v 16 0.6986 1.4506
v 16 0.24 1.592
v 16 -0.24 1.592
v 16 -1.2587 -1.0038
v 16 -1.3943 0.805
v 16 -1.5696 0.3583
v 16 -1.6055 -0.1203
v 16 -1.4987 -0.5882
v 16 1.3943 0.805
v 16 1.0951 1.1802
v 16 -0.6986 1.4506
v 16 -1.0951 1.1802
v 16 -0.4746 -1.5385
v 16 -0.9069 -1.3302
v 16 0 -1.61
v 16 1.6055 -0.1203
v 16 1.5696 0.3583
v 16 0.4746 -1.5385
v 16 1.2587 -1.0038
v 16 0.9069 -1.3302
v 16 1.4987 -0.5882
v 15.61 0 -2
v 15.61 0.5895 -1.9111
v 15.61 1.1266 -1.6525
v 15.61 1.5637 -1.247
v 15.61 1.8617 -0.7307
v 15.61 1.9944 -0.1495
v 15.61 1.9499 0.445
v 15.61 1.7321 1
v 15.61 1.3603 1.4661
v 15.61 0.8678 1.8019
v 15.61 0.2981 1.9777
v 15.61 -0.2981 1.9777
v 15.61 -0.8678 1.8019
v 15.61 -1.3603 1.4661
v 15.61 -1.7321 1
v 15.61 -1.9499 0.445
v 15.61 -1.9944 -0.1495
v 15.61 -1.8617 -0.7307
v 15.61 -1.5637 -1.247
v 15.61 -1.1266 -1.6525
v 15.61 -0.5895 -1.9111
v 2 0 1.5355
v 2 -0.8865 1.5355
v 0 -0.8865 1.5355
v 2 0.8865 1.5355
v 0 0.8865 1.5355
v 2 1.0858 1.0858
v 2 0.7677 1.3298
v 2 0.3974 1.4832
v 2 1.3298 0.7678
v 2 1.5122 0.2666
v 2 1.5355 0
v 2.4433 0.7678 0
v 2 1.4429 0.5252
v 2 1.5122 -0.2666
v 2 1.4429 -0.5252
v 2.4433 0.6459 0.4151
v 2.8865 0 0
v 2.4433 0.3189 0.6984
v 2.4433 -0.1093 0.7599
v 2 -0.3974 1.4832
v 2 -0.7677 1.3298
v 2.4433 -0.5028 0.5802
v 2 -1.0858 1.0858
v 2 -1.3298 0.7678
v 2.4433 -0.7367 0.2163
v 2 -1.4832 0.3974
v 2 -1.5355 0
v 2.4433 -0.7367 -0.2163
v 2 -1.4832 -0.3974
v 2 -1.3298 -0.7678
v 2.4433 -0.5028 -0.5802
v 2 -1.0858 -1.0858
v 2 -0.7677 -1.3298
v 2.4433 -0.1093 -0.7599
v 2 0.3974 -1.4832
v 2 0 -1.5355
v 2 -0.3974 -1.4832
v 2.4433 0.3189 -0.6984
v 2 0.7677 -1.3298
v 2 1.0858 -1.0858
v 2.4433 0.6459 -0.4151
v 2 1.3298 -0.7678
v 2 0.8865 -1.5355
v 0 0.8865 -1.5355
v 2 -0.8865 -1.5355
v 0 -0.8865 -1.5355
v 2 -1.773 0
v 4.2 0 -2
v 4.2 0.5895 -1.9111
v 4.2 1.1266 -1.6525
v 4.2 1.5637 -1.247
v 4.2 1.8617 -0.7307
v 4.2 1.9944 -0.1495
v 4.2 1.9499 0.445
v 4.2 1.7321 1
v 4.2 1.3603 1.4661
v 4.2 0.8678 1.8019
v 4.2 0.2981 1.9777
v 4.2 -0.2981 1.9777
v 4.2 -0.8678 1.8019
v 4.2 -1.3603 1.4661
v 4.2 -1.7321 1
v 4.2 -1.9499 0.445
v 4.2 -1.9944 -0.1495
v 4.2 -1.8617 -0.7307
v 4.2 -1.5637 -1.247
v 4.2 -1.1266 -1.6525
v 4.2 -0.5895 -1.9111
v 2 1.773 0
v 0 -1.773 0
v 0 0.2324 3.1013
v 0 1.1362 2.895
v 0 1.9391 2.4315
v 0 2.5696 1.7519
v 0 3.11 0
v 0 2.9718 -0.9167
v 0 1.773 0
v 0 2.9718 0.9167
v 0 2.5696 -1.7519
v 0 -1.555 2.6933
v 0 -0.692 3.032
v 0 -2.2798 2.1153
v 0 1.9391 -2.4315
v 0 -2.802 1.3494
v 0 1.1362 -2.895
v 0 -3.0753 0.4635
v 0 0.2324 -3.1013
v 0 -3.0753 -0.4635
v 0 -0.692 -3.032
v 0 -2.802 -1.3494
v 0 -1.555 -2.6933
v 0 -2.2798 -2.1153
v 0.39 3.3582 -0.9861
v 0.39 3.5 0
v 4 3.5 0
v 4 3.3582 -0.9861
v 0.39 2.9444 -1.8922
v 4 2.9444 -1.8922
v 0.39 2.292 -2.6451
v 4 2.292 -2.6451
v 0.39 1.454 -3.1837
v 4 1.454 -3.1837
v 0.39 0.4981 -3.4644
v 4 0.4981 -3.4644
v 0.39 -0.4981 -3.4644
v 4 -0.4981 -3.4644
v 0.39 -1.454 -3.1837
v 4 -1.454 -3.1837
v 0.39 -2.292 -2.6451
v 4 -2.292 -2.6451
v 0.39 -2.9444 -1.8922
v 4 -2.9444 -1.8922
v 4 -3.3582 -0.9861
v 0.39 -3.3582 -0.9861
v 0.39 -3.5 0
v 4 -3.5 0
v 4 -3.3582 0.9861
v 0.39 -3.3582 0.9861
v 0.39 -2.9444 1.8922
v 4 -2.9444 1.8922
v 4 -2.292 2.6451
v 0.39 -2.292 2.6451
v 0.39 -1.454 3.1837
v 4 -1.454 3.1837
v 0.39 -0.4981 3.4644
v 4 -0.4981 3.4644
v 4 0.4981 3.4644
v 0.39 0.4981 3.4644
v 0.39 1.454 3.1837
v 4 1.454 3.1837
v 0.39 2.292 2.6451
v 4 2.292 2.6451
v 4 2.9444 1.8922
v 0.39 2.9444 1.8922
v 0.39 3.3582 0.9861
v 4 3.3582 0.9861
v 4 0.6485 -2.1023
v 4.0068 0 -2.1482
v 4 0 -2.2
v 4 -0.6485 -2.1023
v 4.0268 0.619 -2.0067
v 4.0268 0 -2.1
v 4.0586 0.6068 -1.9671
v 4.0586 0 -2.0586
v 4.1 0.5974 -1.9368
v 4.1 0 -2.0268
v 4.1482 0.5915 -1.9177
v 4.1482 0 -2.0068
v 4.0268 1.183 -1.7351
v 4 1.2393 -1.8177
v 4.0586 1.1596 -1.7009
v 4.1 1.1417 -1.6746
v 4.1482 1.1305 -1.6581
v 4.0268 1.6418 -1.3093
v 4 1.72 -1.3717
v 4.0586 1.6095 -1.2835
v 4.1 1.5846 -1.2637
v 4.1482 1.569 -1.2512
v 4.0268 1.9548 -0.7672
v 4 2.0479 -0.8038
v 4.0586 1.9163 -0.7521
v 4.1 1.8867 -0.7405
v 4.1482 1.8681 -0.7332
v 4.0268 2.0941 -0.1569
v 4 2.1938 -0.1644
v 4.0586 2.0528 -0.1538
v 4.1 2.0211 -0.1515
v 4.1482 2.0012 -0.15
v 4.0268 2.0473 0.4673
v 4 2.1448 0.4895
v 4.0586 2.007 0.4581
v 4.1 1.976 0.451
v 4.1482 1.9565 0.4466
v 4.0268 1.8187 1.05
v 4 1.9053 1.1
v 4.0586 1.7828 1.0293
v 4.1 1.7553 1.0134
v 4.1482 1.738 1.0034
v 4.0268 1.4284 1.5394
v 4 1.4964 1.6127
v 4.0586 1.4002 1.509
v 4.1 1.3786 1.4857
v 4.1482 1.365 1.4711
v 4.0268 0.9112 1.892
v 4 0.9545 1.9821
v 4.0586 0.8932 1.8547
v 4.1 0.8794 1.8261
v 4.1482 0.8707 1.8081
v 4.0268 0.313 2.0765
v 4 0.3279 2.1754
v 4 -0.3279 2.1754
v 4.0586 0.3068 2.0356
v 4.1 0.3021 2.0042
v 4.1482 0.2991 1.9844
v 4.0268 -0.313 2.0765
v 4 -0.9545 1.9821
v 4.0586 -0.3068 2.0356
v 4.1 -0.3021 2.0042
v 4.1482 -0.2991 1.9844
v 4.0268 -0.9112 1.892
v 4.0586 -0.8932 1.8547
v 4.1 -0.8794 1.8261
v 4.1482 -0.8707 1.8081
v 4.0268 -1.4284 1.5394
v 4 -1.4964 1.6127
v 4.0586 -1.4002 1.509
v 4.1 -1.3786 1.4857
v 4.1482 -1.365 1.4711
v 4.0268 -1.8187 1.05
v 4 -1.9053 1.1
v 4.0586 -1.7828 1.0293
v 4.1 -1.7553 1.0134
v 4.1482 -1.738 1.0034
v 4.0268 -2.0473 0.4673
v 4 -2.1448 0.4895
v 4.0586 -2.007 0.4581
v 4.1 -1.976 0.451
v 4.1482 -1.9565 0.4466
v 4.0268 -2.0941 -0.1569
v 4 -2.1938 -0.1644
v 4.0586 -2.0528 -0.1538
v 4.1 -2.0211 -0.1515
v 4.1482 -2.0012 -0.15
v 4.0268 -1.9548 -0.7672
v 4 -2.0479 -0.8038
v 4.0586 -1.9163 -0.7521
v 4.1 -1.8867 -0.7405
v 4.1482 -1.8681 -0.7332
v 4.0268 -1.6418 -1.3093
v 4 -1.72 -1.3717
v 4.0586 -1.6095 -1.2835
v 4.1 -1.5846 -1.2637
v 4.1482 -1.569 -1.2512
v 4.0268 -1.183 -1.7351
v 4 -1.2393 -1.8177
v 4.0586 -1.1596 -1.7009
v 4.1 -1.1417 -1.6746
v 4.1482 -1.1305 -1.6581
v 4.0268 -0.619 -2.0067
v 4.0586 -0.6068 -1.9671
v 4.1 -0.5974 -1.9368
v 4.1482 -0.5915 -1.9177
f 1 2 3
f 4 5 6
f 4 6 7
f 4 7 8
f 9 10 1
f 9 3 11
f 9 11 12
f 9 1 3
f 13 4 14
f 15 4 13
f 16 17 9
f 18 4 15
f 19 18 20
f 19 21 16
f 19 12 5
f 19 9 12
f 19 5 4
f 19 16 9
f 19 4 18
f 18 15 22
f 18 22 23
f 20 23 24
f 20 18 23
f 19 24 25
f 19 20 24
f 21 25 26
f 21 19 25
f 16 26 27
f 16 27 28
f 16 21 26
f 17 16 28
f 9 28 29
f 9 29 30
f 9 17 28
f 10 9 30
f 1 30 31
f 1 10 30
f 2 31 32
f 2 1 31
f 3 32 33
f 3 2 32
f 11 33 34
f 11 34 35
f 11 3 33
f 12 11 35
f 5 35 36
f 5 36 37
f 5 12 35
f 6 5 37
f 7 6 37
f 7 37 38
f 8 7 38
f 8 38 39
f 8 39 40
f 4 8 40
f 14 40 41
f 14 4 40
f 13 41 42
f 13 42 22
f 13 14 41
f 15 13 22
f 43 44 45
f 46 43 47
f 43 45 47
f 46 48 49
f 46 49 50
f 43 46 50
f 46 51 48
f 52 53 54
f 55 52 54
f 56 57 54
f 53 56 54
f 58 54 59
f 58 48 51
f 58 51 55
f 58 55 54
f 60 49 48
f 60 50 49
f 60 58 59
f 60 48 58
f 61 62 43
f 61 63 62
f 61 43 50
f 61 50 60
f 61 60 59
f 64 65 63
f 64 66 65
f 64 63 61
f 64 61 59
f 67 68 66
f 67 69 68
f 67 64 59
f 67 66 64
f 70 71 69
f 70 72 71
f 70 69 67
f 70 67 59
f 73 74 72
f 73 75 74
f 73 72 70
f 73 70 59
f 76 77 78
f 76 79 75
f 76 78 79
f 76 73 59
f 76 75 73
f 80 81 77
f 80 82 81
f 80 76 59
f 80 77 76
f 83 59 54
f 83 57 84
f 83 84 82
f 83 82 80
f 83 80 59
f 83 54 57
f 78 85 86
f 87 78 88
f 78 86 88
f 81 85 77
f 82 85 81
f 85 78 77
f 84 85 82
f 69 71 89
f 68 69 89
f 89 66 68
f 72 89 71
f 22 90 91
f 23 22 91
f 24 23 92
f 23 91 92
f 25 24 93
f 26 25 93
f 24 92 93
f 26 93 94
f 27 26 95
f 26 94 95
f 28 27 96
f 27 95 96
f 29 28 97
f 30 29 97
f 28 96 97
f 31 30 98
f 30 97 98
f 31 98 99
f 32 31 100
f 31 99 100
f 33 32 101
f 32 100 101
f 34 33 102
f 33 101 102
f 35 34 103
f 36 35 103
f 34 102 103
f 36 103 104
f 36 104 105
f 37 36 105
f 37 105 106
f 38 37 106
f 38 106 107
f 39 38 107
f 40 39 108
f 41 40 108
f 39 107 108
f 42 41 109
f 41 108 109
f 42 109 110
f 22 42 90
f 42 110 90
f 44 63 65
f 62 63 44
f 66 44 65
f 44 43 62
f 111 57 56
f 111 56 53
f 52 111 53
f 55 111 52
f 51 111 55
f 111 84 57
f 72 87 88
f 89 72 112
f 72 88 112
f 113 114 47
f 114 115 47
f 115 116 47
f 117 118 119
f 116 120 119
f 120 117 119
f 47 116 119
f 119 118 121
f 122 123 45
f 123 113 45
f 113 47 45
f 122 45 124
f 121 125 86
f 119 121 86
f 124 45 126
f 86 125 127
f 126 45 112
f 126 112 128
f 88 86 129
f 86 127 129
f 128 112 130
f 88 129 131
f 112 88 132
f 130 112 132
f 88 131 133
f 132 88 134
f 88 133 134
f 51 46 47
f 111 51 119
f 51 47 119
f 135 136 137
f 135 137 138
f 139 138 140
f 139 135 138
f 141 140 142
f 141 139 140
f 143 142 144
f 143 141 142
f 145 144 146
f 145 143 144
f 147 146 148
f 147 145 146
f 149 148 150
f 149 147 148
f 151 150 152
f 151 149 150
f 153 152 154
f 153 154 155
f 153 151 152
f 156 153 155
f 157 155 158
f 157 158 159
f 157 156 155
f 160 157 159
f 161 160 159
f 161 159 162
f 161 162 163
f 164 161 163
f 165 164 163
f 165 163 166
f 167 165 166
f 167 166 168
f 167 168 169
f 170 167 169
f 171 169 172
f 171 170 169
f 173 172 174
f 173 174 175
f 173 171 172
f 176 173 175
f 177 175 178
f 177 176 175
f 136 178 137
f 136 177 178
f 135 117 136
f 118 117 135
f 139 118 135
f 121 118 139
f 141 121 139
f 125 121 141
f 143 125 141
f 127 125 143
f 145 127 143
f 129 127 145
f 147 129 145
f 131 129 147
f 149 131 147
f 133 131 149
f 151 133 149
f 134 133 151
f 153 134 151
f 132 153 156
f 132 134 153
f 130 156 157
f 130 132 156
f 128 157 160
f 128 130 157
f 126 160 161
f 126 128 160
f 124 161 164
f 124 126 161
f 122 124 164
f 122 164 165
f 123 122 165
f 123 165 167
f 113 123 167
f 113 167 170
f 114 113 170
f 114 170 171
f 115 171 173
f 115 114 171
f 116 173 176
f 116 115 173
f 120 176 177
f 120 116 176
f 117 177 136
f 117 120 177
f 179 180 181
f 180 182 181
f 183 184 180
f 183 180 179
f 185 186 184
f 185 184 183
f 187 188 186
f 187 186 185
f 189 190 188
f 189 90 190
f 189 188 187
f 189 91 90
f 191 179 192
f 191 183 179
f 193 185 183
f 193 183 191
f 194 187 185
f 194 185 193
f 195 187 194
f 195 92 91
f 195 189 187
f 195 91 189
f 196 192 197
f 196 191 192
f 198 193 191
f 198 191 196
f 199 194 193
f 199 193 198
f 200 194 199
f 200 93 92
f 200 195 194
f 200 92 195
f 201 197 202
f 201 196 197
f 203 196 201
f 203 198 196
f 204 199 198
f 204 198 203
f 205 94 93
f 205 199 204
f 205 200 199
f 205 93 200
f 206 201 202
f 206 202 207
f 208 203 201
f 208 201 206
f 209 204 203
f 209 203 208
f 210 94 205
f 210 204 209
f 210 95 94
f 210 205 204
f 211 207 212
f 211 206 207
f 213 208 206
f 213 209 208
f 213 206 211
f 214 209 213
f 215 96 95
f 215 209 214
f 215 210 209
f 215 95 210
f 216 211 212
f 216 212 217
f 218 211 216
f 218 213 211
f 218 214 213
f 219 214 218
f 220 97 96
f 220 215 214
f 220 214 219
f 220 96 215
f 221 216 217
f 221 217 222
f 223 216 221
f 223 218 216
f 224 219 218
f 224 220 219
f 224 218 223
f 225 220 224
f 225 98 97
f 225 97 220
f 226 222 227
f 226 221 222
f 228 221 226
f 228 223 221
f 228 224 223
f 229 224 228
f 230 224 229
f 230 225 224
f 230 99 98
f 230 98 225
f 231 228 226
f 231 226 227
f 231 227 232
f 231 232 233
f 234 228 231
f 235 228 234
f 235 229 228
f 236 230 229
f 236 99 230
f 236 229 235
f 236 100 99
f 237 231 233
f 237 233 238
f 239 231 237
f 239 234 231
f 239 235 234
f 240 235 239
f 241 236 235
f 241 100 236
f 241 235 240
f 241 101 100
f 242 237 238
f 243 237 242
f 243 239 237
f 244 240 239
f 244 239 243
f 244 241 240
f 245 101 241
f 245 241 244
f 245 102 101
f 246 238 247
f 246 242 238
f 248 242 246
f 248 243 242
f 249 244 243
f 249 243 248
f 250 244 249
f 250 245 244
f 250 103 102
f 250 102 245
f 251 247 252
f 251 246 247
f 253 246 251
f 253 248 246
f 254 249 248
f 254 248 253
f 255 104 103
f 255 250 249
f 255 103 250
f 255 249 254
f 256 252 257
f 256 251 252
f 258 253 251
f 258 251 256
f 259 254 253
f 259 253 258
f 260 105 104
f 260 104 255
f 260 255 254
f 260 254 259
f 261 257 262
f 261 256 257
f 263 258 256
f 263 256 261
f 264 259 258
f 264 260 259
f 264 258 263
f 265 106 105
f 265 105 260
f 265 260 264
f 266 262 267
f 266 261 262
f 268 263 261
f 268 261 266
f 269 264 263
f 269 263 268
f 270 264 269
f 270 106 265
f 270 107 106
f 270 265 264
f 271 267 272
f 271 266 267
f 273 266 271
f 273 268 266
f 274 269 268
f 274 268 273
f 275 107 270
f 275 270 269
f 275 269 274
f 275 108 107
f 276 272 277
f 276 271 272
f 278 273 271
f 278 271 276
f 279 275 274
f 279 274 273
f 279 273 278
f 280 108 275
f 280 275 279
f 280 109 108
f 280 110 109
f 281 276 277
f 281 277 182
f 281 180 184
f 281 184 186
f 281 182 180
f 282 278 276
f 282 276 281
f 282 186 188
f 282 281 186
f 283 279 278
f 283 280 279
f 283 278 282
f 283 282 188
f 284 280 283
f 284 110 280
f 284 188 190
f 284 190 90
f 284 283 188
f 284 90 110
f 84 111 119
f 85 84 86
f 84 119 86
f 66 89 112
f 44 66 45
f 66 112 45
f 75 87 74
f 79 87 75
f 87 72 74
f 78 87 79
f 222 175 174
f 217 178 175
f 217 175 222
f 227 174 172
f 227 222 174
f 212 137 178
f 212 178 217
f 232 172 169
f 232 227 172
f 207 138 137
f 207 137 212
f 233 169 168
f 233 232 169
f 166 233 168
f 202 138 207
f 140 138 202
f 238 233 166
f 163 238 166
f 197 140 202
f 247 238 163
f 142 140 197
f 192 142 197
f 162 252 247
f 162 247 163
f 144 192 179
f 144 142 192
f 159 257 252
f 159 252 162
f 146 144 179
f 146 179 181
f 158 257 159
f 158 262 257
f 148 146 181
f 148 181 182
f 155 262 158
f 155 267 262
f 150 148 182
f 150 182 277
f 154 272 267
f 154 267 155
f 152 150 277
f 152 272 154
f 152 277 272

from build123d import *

# Parameters (mm, degrees)
SKETCH1_W           = 4
SKETCH1_H           = 3.5
SKETCH2_R           = 2
BOSS_EXTRUDE1_DEPTH = 12
CUT_EXTRUDE1_DEPTH  = 2
CHAMFER1_SIZE       = 0.39
FILLET1_R           = 0.2


with BuildPart() as part:
    # Sketch1 → Revolve1 (revolve)
    with BuildSketch(Plane(origin=(0, 0, 0), x_dir=(-1, 0, 0), z_dir=(0, 0, -1))):
        with Locations((-2, 1.75)):
            Rectangle(SKETCH1_W, SKETCH1_H)
    revolve(axis=Axis((4, 0, 0), (-1, 0, 0)))

    # Sketch2 → Boss-Extrude1 (add)
    with BuildSketch(Plane(origin=(4, 0, 0), x_dir=(0, 0, -1), z_dir=(1, 0, 0))):
        Circle(SKETCH2_R)
    extrude(amount=BOSS_EXTRUDE1_DEPTH)

    # Sketch3 → Cut-Extrude1 (cut)
    with BuildSketch(Plane.ZY):
        Polygon((1.5355, -0.886521338), (1.5355, 0.886521338), (0, 1.773042677), (-1.5355, 0.886521338), (-1.5355, -0.886521338), (0, -1.773042677), align=None)
    extrude(amount=-CUT_EXTRUDE1_DEPTH, mode=Mode.SUBTRACT)

    # Sketch4 → Cut-Revolve1 (revolve, cut)
    with BuildSketch(Plane.XY):
        Polygon((2, 1.5355), (2, 0), (2.886521338, 0), align=None)
    revolve(axis=Axis((2, 0, 0), (1, 0, 0)), mode=Mode.SUBTRACT)

    # Chamfer1
    chamfer1_edges = [part.edges().sort_by_distance(p)[0] for p in [
        (0, -3.5, 0),
        (16, 0, 2),
    ]]
    chamfer(chamfer1_edges, length=CHAMFER1_SIZE)

    # Fillet1
    fillet1_edges = [part.edges().sort_by_distance(p)[0] for p in [
        (4, 0, 2),
    ]]
    fillet(fillet1_edges, radius=FILLET1_R)


solid = part.part
